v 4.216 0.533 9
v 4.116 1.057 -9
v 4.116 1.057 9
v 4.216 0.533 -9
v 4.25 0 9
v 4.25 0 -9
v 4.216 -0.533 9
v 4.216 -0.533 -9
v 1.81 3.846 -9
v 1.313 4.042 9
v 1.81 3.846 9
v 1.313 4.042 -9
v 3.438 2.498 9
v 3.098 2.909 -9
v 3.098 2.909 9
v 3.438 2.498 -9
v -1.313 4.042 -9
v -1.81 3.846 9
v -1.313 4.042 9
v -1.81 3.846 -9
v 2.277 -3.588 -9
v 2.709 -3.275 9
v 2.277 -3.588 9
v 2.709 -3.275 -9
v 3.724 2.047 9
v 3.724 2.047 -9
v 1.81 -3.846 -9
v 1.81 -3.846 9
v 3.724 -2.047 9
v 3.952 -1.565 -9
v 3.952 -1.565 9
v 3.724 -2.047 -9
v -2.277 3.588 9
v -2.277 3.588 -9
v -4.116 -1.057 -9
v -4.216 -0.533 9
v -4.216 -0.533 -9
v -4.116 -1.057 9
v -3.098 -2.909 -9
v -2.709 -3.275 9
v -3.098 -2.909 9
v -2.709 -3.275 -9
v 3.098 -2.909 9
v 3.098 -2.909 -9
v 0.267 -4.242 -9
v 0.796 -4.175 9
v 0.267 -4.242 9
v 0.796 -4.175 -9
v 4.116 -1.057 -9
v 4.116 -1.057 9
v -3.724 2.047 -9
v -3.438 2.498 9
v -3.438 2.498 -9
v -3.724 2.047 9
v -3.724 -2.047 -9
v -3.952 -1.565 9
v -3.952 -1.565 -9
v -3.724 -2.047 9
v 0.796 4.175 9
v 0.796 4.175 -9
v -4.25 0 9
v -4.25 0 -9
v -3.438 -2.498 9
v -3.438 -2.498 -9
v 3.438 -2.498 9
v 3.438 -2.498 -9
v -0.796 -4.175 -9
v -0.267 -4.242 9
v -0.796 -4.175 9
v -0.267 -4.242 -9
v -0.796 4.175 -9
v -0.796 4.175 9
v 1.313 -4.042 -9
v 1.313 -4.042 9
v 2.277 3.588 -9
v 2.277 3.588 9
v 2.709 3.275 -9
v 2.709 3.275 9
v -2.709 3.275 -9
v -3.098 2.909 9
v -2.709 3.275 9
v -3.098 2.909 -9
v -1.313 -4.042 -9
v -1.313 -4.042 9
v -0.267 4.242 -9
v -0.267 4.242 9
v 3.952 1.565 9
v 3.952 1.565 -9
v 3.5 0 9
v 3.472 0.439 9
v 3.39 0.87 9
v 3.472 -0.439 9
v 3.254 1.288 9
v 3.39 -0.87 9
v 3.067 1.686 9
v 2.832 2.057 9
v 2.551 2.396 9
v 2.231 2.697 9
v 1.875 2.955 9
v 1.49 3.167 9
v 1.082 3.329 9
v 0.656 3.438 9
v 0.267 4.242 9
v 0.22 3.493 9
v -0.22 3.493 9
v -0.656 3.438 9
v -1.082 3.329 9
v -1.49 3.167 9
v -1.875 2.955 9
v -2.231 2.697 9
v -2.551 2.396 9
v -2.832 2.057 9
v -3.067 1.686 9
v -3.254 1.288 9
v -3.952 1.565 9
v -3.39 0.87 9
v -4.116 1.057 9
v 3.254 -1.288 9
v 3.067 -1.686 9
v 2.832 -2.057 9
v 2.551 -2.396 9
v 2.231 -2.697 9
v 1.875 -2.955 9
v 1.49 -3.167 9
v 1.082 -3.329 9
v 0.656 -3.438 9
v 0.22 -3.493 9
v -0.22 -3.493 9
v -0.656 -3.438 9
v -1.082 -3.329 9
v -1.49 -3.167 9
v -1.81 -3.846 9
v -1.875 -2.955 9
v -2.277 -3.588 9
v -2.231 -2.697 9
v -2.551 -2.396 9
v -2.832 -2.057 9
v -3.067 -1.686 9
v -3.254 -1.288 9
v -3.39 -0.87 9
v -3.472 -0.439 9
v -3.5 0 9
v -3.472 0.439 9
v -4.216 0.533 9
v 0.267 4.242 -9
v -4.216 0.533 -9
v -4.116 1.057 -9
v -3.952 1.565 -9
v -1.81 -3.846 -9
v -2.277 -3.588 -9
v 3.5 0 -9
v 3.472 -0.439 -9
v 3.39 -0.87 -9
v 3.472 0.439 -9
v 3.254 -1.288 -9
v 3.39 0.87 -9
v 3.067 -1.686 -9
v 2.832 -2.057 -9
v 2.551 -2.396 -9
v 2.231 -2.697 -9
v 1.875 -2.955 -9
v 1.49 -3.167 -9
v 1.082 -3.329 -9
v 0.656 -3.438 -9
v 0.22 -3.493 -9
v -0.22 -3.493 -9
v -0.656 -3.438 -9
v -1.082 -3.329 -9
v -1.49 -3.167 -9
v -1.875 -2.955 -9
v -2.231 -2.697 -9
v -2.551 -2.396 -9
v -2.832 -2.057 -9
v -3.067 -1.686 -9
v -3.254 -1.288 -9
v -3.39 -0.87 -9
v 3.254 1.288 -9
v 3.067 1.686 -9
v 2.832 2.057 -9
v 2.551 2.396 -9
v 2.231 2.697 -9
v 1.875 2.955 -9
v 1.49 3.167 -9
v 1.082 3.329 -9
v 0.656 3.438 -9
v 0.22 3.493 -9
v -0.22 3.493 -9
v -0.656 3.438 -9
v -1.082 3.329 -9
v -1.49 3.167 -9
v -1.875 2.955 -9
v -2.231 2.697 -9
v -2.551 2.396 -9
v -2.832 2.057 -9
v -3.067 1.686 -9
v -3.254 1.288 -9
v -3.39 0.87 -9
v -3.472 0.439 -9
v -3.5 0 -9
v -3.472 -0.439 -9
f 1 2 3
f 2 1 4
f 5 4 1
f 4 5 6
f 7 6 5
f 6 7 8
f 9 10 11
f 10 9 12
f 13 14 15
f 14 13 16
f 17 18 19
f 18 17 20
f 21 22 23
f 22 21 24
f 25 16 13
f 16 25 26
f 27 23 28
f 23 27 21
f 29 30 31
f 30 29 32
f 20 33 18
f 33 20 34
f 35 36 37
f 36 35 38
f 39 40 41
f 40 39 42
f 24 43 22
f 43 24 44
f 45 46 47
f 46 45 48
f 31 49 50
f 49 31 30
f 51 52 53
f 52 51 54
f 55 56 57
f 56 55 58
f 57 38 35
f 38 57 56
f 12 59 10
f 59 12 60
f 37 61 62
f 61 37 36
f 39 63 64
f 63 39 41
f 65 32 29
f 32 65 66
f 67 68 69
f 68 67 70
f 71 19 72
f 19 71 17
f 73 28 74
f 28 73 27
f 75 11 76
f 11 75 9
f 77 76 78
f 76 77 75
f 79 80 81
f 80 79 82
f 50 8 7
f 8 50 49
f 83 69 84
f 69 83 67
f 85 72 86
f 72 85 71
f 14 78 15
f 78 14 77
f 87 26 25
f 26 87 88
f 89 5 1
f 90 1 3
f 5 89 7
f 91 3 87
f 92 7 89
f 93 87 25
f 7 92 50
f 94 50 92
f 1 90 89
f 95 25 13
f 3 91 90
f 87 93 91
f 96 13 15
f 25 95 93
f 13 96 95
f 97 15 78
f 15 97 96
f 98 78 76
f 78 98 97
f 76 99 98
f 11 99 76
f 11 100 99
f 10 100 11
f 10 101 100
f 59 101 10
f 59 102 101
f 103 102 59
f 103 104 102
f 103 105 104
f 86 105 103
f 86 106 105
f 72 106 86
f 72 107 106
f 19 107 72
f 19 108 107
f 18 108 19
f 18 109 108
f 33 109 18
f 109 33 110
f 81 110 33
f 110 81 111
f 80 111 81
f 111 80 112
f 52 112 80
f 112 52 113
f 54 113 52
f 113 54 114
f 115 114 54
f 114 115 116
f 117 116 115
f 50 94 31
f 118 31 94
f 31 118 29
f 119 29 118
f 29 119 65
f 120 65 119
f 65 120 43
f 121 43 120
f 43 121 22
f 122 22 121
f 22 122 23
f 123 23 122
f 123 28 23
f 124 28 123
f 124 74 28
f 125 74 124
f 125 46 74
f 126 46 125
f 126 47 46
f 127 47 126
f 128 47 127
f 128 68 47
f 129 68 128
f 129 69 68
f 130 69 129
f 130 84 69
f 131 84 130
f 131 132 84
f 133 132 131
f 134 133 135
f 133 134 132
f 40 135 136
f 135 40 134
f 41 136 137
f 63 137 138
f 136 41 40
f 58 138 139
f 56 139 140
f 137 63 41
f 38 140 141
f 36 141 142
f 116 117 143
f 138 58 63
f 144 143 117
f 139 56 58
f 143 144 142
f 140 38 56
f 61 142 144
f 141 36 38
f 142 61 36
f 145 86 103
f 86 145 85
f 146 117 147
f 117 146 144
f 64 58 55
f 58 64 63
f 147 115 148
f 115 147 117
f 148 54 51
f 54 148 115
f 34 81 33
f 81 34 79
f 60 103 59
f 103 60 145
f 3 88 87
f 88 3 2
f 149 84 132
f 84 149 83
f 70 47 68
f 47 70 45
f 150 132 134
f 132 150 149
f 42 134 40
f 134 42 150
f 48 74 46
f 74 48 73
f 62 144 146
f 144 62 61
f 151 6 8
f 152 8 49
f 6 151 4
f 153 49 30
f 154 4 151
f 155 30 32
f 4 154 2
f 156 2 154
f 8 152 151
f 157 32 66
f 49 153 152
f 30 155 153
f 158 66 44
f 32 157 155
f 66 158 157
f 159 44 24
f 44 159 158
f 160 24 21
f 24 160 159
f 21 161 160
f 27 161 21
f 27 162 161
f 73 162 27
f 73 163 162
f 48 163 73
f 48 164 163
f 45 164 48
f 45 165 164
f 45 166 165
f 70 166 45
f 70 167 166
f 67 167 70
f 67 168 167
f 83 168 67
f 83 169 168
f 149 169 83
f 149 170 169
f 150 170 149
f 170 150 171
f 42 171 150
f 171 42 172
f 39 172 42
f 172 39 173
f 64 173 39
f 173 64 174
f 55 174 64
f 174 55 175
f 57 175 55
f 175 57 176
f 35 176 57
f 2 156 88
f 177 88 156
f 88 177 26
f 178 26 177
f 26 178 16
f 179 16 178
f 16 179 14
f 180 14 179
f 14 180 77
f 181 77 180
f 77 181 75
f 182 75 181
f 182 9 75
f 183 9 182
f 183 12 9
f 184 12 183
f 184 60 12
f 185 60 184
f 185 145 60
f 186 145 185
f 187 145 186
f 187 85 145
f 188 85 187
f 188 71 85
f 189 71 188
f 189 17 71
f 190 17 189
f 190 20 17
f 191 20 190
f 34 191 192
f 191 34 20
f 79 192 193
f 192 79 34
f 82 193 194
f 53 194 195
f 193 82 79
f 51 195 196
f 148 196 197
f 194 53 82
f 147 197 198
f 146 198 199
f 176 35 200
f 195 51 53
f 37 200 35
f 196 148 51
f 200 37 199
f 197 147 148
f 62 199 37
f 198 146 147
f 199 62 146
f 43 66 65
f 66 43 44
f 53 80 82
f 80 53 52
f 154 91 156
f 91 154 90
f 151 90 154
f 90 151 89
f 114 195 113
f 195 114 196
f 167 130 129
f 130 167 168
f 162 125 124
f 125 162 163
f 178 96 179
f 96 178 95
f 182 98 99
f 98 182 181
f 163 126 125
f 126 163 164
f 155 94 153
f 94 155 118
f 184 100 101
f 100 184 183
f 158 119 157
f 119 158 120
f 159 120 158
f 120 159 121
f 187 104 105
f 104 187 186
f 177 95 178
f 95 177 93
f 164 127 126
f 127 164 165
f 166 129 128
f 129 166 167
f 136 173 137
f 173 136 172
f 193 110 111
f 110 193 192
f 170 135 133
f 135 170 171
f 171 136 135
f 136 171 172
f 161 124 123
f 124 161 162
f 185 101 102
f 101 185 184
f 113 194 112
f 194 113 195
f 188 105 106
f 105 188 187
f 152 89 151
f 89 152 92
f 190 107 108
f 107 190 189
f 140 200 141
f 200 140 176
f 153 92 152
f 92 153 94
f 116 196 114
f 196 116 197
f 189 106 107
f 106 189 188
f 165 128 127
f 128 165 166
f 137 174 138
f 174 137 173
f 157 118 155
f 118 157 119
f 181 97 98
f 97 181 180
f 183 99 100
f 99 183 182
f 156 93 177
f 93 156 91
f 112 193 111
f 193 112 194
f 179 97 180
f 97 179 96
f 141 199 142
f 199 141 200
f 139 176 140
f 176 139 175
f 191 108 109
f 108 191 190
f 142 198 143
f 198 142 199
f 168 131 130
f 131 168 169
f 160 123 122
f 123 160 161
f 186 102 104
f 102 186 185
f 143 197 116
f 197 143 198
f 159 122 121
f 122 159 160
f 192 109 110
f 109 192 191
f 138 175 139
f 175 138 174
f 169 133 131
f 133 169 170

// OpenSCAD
$fn = 50;


difference() {
	union() {
		translate(v = [0, 0, -9.0000000000]) {
			cylinder(h = 18, r = 4.2500000000);
		}
	}
	union() {
		translate(v = [0, 0, -100.0000000000]) {
			cylinder(h = 200, r = 3.5000000000);
		}
	}
}
